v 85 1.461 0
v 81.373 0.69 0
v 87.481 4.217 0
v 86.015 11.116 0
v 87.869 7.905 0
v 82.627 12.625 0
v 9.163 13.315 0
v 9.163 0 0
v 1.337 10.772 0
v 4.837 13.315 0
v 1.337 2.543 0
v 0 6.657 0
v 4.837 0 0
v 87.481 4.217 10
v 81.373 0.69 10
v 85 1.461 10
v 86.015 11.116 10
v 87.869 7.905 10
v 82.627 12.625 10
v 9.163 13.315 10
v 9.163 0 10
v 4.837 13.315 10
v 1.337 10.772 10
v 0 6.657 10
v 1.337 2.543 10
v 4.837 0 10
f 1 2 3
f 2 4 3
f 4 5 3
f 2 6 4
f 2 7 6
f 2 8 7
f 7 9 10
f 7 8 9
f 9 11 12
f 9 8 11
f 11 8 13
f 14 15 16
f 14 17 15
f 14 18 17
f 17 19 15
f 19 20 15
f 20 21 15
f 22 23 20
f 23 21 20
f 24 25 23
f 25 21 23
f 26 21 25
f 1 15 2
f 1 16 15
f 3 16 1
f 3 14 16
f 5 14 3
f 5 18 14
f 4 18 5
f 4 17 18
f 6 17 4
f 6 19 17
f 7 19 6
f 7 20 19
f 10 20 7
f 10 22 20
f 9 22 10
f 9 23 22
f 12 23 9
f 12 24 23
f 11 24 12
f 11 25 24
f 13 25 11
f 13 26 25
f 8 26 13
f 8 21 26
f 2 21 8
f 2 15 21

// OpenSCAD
$fn = 32;

// ----------------------------------------------------------------------
// Lever arm: two bosses 14 and 12 mm, 75 mm between centres
// ----------------------------------------------------------------------

// --- parameters (mm) ---
profile_height = 10;      // extrusion height
profile_points = 13;      // points of the closed outline

profile = [[0, 6.657], [1.337, 2.543], [4.837, 0], [9.163, 0], [81.373, 0.69], [85, 1.461], [87.481, 4.217], [87.869, 7.905], [86.015, 11.116], [82.627, 12.625], [9.163, 13.315], [4.837, 13.315], [1.337, 10.772]];  // single closed polygon, 13 points, counter clockwise

// --- the one profile operation ---
linear_extrude(height = profile_height) polygon(points = profile);
